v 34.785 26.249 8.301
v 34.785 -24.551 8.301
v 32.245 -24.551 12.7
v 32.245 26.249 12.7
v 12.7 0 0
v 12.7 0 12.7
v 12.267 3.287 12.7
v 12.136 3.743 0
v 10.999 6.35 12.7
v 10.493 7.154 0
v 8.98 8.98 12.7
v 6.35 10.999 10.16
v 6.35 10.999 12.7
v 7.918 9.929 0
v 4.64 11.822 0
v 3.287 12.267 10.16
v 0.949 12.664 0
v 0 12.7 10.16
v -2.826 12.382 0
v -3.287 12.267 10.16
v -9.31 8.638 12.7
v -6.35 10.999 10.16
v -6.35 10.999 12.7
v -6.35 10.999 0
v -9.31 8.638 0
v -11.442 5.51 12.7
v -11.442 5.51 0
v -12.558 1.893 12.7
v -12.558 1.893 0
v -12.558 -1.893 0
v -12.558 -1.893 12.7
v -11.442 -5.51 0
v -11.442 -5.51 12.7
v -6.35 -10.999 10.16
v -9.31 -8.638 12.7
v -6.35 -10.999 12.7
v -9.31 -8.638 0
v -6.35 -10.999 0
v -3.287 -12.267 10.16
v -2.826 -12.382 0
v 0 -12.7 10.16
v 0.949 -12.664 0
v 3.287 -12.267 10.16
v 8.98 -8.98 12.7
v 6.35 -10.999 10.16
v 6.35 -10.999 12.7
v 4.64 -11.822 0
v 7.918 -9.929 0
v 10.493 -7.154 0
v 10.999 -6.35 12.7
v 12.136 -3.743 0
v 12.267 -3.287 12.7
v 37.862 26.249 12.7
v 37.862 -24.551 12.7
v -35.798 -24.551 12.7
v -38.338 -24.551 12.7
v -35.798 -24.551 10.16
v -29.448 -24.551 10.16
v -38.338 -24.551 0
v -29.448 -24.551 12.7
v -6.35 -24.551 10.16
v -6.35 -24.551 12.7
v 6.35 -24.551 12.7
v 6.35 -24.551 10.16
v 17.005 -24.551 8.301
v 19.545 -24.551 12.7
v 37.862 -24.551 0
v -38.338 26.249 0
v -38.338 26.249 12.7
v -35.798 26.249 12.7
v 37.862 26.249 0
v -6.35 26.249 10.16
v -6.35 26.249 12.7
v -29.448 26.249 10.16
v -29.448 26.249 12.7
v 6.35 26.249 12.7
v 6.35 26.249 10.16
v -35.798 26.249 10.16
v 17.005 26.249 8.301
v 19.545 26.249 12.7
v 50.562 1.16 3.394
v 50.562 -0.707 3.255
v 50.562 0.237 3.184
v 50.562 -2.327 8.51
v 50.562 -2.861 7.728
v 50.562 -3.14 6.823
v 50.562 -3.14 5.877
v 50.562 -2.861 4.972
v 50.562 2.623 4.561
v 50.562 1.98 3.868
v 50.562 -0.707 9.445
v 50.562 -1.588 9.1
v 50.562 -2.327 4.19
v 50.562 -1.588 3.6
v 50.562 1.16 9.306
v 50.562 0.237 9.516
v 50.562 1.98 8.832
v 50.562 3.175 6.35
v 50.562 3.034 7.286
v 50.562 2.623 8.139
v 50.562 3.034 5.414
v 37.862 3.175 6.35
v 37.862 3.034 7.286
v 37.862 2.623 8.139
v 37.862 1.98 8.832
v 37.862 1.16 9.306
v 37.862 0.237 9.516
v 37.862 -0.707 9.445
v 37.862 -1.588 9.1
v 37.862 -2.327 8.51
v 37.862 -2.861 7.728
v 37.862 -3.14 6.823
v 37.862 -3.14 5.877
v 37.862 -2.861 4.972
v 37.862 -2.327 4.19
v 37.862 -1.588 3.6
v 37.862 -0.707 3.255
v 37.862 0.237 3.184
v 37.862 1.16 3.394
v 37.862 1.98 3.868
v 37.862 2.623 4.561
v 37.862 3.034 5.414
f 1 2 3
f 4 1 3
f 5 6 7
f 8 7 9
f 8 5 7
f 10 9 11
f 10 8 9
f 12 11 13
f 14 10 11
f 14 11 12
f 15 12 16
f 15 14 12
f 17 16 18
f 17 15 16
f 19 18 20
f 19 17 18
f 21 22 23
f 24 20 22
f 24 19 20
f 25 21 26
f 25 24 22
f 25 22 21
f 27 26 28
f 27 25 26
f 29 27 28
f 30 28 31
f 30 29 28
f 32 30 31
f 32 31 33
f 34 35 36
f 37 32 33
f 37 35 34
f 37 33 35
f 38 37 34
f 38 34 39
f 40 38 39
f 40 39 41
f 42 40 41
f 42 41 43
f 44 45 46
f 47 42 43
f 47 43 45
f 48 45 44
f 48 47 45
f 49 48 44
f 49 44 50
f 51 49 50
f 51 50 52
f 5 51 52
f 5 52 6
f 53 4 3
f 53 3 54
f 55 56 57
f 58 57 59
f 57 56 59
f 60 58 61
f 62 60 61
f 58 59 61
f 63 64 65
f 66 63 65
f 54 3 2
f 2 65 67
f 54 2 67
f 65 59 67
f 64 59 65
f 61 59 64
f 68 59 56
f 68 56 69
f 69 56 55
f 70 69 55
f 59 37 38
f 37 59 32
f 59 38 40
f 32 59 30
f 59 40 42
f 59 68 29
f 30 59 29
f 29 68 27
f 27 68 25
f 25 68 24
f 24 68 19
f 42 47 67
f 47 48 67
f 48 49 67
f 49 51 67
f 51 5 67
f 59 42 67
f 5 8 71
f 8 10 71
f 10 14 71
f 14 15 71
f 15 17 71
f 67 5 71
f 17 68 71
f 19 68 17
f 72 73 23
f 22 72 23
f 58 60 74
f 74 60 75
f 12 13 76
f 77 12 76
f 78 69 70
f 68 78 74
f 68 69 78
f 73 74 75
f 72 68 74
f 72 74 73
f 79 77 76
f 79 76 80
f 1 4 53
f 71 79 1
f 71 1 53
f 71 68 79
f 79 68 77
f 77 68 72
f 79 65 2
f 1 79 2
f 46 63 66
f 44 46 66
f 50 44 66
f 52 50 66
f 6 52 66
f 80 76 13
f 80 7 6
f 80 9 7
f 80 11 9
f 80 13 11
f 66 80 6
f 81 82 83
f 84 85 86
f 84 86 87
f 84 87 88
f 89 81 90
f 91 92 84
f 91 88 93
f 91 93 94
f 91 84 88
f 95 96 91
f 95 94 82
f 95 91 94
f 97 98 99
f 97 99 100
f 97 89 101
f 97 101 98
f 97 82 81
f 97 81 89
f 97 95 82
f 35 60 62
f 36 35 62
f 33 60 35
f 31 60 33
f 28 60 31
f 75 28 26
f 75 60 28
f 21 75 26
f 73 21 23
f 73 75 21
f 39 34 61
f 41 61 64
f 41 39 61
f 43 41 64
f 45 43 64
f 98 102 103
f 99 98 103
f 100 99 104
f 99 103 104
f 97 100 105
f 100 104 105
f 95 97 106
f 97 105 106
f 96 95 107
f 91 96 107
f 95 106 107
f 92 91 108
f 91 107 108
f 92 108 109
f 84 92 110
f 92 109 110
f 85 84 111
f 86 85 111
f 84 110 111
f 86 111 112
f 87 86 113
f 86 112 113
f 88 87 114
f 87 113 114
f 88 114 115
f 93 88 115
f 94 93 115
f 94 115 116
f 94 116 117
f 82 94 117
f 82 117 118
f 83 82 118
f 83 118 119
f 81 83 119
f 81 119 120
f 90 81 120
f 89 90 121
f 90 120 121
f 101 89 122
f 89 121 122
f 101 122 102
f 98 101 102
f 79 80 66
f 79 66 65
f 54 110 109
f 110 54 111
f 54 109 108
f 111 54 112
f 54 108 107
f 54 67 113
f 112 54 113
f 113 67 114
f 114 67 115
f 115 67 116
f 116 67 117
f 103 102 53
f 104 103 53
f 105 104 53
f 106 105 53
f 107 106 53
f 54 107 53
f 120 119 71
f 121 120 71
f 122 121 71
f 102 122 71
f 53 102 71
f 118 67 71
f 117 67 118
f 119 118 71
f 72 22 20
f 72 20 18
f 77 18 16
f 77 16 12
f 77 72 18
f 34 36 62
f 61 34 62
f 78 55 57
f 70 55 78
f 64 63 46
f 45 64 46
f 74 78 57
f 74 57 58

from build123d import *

# Parameters (mm, degrees)
F0_W     = 76.2
F0_H     = 50.8
F0_R     = 12.7
F1_DEPTH = 12.7
F2_W     = 6.35
F2_H     = 50.8
F3_DEPTH = 2.54
F5_DEPTH = 58
F6_R     = 3.175
F7_DEPTH = 12.7


# Not quite as in the source:
# - a feature names something its author has since deleted; it is built from what else it names


with BuildPart() as f1:
    # F0 (on Top) → F1 (new body)
    with BuildSketch(Plane.XY):
        with Locations((-0.2381126344, 0.8489250481)):
            Rectangle(F0_W, F0_H)
        Circle(F0_R, mode=Mode.SUBTRACT)
    extrude(amount=F1_DEPTH)

    # F2 (on face) → F3 (cut)
    with BuildSketch(Plane.XY.offset(12.7)):
        with BuildLine():
            Line((6.35, 26.2489250481), (-6.35, 26.2489250481))
            Line((-6.35, 26.2489250481), (-6.35, 10.9985226281))
            ThreePointArc((-6.35, 10.9985226281), (0, 12.7), (6.35, 10.9985226281))
            Line((6.35, 10.9985226281), (6.35, 26.2489250481))
        make_face()
        with BuildLine():
            ThreePointArc((6.35, -10.9985226281), (0, -12.7), (-6.35, -10.9985226281))
            Line((-6.35, -10.9985226281), (-6.35, -24.5510749519))
            Line((-6.35, -24.5510749519), (6.35, -24.5510749519))
            Line((6.35, -24.5510749519), (6.35, -10.9985226281))
        make_face()
        with Locations((-32.6231126344, 0.8489250481)):
            Rectangle(F2_W, F2_H)
    extrude(amount=-F3_DEPTH, mode=Mode.SUBTRACT)

    # F4 (on face) → F5 (cut)
    with BuildSketch(Plane.XZ.offset(24.5510749519)):
        Polygon((32.2451825857, 12.7), (19.5451825857, 12.7), (17.0051825857, 8.3005909488), (34.7851825857, 8.3005909488), align=None)
    extrude(amount=-F5_DEPTH, mode=Mode.SUBTRACT)

    # F6 (on face) → F7 (join)
    with BuildSketch(Plane.YZ.offset(37.8618873656)):
        with Locations((0, 6.35)):
            Circle(F6_R)
    extrude(amount=F7_DEPTH)


solid = f1.part
